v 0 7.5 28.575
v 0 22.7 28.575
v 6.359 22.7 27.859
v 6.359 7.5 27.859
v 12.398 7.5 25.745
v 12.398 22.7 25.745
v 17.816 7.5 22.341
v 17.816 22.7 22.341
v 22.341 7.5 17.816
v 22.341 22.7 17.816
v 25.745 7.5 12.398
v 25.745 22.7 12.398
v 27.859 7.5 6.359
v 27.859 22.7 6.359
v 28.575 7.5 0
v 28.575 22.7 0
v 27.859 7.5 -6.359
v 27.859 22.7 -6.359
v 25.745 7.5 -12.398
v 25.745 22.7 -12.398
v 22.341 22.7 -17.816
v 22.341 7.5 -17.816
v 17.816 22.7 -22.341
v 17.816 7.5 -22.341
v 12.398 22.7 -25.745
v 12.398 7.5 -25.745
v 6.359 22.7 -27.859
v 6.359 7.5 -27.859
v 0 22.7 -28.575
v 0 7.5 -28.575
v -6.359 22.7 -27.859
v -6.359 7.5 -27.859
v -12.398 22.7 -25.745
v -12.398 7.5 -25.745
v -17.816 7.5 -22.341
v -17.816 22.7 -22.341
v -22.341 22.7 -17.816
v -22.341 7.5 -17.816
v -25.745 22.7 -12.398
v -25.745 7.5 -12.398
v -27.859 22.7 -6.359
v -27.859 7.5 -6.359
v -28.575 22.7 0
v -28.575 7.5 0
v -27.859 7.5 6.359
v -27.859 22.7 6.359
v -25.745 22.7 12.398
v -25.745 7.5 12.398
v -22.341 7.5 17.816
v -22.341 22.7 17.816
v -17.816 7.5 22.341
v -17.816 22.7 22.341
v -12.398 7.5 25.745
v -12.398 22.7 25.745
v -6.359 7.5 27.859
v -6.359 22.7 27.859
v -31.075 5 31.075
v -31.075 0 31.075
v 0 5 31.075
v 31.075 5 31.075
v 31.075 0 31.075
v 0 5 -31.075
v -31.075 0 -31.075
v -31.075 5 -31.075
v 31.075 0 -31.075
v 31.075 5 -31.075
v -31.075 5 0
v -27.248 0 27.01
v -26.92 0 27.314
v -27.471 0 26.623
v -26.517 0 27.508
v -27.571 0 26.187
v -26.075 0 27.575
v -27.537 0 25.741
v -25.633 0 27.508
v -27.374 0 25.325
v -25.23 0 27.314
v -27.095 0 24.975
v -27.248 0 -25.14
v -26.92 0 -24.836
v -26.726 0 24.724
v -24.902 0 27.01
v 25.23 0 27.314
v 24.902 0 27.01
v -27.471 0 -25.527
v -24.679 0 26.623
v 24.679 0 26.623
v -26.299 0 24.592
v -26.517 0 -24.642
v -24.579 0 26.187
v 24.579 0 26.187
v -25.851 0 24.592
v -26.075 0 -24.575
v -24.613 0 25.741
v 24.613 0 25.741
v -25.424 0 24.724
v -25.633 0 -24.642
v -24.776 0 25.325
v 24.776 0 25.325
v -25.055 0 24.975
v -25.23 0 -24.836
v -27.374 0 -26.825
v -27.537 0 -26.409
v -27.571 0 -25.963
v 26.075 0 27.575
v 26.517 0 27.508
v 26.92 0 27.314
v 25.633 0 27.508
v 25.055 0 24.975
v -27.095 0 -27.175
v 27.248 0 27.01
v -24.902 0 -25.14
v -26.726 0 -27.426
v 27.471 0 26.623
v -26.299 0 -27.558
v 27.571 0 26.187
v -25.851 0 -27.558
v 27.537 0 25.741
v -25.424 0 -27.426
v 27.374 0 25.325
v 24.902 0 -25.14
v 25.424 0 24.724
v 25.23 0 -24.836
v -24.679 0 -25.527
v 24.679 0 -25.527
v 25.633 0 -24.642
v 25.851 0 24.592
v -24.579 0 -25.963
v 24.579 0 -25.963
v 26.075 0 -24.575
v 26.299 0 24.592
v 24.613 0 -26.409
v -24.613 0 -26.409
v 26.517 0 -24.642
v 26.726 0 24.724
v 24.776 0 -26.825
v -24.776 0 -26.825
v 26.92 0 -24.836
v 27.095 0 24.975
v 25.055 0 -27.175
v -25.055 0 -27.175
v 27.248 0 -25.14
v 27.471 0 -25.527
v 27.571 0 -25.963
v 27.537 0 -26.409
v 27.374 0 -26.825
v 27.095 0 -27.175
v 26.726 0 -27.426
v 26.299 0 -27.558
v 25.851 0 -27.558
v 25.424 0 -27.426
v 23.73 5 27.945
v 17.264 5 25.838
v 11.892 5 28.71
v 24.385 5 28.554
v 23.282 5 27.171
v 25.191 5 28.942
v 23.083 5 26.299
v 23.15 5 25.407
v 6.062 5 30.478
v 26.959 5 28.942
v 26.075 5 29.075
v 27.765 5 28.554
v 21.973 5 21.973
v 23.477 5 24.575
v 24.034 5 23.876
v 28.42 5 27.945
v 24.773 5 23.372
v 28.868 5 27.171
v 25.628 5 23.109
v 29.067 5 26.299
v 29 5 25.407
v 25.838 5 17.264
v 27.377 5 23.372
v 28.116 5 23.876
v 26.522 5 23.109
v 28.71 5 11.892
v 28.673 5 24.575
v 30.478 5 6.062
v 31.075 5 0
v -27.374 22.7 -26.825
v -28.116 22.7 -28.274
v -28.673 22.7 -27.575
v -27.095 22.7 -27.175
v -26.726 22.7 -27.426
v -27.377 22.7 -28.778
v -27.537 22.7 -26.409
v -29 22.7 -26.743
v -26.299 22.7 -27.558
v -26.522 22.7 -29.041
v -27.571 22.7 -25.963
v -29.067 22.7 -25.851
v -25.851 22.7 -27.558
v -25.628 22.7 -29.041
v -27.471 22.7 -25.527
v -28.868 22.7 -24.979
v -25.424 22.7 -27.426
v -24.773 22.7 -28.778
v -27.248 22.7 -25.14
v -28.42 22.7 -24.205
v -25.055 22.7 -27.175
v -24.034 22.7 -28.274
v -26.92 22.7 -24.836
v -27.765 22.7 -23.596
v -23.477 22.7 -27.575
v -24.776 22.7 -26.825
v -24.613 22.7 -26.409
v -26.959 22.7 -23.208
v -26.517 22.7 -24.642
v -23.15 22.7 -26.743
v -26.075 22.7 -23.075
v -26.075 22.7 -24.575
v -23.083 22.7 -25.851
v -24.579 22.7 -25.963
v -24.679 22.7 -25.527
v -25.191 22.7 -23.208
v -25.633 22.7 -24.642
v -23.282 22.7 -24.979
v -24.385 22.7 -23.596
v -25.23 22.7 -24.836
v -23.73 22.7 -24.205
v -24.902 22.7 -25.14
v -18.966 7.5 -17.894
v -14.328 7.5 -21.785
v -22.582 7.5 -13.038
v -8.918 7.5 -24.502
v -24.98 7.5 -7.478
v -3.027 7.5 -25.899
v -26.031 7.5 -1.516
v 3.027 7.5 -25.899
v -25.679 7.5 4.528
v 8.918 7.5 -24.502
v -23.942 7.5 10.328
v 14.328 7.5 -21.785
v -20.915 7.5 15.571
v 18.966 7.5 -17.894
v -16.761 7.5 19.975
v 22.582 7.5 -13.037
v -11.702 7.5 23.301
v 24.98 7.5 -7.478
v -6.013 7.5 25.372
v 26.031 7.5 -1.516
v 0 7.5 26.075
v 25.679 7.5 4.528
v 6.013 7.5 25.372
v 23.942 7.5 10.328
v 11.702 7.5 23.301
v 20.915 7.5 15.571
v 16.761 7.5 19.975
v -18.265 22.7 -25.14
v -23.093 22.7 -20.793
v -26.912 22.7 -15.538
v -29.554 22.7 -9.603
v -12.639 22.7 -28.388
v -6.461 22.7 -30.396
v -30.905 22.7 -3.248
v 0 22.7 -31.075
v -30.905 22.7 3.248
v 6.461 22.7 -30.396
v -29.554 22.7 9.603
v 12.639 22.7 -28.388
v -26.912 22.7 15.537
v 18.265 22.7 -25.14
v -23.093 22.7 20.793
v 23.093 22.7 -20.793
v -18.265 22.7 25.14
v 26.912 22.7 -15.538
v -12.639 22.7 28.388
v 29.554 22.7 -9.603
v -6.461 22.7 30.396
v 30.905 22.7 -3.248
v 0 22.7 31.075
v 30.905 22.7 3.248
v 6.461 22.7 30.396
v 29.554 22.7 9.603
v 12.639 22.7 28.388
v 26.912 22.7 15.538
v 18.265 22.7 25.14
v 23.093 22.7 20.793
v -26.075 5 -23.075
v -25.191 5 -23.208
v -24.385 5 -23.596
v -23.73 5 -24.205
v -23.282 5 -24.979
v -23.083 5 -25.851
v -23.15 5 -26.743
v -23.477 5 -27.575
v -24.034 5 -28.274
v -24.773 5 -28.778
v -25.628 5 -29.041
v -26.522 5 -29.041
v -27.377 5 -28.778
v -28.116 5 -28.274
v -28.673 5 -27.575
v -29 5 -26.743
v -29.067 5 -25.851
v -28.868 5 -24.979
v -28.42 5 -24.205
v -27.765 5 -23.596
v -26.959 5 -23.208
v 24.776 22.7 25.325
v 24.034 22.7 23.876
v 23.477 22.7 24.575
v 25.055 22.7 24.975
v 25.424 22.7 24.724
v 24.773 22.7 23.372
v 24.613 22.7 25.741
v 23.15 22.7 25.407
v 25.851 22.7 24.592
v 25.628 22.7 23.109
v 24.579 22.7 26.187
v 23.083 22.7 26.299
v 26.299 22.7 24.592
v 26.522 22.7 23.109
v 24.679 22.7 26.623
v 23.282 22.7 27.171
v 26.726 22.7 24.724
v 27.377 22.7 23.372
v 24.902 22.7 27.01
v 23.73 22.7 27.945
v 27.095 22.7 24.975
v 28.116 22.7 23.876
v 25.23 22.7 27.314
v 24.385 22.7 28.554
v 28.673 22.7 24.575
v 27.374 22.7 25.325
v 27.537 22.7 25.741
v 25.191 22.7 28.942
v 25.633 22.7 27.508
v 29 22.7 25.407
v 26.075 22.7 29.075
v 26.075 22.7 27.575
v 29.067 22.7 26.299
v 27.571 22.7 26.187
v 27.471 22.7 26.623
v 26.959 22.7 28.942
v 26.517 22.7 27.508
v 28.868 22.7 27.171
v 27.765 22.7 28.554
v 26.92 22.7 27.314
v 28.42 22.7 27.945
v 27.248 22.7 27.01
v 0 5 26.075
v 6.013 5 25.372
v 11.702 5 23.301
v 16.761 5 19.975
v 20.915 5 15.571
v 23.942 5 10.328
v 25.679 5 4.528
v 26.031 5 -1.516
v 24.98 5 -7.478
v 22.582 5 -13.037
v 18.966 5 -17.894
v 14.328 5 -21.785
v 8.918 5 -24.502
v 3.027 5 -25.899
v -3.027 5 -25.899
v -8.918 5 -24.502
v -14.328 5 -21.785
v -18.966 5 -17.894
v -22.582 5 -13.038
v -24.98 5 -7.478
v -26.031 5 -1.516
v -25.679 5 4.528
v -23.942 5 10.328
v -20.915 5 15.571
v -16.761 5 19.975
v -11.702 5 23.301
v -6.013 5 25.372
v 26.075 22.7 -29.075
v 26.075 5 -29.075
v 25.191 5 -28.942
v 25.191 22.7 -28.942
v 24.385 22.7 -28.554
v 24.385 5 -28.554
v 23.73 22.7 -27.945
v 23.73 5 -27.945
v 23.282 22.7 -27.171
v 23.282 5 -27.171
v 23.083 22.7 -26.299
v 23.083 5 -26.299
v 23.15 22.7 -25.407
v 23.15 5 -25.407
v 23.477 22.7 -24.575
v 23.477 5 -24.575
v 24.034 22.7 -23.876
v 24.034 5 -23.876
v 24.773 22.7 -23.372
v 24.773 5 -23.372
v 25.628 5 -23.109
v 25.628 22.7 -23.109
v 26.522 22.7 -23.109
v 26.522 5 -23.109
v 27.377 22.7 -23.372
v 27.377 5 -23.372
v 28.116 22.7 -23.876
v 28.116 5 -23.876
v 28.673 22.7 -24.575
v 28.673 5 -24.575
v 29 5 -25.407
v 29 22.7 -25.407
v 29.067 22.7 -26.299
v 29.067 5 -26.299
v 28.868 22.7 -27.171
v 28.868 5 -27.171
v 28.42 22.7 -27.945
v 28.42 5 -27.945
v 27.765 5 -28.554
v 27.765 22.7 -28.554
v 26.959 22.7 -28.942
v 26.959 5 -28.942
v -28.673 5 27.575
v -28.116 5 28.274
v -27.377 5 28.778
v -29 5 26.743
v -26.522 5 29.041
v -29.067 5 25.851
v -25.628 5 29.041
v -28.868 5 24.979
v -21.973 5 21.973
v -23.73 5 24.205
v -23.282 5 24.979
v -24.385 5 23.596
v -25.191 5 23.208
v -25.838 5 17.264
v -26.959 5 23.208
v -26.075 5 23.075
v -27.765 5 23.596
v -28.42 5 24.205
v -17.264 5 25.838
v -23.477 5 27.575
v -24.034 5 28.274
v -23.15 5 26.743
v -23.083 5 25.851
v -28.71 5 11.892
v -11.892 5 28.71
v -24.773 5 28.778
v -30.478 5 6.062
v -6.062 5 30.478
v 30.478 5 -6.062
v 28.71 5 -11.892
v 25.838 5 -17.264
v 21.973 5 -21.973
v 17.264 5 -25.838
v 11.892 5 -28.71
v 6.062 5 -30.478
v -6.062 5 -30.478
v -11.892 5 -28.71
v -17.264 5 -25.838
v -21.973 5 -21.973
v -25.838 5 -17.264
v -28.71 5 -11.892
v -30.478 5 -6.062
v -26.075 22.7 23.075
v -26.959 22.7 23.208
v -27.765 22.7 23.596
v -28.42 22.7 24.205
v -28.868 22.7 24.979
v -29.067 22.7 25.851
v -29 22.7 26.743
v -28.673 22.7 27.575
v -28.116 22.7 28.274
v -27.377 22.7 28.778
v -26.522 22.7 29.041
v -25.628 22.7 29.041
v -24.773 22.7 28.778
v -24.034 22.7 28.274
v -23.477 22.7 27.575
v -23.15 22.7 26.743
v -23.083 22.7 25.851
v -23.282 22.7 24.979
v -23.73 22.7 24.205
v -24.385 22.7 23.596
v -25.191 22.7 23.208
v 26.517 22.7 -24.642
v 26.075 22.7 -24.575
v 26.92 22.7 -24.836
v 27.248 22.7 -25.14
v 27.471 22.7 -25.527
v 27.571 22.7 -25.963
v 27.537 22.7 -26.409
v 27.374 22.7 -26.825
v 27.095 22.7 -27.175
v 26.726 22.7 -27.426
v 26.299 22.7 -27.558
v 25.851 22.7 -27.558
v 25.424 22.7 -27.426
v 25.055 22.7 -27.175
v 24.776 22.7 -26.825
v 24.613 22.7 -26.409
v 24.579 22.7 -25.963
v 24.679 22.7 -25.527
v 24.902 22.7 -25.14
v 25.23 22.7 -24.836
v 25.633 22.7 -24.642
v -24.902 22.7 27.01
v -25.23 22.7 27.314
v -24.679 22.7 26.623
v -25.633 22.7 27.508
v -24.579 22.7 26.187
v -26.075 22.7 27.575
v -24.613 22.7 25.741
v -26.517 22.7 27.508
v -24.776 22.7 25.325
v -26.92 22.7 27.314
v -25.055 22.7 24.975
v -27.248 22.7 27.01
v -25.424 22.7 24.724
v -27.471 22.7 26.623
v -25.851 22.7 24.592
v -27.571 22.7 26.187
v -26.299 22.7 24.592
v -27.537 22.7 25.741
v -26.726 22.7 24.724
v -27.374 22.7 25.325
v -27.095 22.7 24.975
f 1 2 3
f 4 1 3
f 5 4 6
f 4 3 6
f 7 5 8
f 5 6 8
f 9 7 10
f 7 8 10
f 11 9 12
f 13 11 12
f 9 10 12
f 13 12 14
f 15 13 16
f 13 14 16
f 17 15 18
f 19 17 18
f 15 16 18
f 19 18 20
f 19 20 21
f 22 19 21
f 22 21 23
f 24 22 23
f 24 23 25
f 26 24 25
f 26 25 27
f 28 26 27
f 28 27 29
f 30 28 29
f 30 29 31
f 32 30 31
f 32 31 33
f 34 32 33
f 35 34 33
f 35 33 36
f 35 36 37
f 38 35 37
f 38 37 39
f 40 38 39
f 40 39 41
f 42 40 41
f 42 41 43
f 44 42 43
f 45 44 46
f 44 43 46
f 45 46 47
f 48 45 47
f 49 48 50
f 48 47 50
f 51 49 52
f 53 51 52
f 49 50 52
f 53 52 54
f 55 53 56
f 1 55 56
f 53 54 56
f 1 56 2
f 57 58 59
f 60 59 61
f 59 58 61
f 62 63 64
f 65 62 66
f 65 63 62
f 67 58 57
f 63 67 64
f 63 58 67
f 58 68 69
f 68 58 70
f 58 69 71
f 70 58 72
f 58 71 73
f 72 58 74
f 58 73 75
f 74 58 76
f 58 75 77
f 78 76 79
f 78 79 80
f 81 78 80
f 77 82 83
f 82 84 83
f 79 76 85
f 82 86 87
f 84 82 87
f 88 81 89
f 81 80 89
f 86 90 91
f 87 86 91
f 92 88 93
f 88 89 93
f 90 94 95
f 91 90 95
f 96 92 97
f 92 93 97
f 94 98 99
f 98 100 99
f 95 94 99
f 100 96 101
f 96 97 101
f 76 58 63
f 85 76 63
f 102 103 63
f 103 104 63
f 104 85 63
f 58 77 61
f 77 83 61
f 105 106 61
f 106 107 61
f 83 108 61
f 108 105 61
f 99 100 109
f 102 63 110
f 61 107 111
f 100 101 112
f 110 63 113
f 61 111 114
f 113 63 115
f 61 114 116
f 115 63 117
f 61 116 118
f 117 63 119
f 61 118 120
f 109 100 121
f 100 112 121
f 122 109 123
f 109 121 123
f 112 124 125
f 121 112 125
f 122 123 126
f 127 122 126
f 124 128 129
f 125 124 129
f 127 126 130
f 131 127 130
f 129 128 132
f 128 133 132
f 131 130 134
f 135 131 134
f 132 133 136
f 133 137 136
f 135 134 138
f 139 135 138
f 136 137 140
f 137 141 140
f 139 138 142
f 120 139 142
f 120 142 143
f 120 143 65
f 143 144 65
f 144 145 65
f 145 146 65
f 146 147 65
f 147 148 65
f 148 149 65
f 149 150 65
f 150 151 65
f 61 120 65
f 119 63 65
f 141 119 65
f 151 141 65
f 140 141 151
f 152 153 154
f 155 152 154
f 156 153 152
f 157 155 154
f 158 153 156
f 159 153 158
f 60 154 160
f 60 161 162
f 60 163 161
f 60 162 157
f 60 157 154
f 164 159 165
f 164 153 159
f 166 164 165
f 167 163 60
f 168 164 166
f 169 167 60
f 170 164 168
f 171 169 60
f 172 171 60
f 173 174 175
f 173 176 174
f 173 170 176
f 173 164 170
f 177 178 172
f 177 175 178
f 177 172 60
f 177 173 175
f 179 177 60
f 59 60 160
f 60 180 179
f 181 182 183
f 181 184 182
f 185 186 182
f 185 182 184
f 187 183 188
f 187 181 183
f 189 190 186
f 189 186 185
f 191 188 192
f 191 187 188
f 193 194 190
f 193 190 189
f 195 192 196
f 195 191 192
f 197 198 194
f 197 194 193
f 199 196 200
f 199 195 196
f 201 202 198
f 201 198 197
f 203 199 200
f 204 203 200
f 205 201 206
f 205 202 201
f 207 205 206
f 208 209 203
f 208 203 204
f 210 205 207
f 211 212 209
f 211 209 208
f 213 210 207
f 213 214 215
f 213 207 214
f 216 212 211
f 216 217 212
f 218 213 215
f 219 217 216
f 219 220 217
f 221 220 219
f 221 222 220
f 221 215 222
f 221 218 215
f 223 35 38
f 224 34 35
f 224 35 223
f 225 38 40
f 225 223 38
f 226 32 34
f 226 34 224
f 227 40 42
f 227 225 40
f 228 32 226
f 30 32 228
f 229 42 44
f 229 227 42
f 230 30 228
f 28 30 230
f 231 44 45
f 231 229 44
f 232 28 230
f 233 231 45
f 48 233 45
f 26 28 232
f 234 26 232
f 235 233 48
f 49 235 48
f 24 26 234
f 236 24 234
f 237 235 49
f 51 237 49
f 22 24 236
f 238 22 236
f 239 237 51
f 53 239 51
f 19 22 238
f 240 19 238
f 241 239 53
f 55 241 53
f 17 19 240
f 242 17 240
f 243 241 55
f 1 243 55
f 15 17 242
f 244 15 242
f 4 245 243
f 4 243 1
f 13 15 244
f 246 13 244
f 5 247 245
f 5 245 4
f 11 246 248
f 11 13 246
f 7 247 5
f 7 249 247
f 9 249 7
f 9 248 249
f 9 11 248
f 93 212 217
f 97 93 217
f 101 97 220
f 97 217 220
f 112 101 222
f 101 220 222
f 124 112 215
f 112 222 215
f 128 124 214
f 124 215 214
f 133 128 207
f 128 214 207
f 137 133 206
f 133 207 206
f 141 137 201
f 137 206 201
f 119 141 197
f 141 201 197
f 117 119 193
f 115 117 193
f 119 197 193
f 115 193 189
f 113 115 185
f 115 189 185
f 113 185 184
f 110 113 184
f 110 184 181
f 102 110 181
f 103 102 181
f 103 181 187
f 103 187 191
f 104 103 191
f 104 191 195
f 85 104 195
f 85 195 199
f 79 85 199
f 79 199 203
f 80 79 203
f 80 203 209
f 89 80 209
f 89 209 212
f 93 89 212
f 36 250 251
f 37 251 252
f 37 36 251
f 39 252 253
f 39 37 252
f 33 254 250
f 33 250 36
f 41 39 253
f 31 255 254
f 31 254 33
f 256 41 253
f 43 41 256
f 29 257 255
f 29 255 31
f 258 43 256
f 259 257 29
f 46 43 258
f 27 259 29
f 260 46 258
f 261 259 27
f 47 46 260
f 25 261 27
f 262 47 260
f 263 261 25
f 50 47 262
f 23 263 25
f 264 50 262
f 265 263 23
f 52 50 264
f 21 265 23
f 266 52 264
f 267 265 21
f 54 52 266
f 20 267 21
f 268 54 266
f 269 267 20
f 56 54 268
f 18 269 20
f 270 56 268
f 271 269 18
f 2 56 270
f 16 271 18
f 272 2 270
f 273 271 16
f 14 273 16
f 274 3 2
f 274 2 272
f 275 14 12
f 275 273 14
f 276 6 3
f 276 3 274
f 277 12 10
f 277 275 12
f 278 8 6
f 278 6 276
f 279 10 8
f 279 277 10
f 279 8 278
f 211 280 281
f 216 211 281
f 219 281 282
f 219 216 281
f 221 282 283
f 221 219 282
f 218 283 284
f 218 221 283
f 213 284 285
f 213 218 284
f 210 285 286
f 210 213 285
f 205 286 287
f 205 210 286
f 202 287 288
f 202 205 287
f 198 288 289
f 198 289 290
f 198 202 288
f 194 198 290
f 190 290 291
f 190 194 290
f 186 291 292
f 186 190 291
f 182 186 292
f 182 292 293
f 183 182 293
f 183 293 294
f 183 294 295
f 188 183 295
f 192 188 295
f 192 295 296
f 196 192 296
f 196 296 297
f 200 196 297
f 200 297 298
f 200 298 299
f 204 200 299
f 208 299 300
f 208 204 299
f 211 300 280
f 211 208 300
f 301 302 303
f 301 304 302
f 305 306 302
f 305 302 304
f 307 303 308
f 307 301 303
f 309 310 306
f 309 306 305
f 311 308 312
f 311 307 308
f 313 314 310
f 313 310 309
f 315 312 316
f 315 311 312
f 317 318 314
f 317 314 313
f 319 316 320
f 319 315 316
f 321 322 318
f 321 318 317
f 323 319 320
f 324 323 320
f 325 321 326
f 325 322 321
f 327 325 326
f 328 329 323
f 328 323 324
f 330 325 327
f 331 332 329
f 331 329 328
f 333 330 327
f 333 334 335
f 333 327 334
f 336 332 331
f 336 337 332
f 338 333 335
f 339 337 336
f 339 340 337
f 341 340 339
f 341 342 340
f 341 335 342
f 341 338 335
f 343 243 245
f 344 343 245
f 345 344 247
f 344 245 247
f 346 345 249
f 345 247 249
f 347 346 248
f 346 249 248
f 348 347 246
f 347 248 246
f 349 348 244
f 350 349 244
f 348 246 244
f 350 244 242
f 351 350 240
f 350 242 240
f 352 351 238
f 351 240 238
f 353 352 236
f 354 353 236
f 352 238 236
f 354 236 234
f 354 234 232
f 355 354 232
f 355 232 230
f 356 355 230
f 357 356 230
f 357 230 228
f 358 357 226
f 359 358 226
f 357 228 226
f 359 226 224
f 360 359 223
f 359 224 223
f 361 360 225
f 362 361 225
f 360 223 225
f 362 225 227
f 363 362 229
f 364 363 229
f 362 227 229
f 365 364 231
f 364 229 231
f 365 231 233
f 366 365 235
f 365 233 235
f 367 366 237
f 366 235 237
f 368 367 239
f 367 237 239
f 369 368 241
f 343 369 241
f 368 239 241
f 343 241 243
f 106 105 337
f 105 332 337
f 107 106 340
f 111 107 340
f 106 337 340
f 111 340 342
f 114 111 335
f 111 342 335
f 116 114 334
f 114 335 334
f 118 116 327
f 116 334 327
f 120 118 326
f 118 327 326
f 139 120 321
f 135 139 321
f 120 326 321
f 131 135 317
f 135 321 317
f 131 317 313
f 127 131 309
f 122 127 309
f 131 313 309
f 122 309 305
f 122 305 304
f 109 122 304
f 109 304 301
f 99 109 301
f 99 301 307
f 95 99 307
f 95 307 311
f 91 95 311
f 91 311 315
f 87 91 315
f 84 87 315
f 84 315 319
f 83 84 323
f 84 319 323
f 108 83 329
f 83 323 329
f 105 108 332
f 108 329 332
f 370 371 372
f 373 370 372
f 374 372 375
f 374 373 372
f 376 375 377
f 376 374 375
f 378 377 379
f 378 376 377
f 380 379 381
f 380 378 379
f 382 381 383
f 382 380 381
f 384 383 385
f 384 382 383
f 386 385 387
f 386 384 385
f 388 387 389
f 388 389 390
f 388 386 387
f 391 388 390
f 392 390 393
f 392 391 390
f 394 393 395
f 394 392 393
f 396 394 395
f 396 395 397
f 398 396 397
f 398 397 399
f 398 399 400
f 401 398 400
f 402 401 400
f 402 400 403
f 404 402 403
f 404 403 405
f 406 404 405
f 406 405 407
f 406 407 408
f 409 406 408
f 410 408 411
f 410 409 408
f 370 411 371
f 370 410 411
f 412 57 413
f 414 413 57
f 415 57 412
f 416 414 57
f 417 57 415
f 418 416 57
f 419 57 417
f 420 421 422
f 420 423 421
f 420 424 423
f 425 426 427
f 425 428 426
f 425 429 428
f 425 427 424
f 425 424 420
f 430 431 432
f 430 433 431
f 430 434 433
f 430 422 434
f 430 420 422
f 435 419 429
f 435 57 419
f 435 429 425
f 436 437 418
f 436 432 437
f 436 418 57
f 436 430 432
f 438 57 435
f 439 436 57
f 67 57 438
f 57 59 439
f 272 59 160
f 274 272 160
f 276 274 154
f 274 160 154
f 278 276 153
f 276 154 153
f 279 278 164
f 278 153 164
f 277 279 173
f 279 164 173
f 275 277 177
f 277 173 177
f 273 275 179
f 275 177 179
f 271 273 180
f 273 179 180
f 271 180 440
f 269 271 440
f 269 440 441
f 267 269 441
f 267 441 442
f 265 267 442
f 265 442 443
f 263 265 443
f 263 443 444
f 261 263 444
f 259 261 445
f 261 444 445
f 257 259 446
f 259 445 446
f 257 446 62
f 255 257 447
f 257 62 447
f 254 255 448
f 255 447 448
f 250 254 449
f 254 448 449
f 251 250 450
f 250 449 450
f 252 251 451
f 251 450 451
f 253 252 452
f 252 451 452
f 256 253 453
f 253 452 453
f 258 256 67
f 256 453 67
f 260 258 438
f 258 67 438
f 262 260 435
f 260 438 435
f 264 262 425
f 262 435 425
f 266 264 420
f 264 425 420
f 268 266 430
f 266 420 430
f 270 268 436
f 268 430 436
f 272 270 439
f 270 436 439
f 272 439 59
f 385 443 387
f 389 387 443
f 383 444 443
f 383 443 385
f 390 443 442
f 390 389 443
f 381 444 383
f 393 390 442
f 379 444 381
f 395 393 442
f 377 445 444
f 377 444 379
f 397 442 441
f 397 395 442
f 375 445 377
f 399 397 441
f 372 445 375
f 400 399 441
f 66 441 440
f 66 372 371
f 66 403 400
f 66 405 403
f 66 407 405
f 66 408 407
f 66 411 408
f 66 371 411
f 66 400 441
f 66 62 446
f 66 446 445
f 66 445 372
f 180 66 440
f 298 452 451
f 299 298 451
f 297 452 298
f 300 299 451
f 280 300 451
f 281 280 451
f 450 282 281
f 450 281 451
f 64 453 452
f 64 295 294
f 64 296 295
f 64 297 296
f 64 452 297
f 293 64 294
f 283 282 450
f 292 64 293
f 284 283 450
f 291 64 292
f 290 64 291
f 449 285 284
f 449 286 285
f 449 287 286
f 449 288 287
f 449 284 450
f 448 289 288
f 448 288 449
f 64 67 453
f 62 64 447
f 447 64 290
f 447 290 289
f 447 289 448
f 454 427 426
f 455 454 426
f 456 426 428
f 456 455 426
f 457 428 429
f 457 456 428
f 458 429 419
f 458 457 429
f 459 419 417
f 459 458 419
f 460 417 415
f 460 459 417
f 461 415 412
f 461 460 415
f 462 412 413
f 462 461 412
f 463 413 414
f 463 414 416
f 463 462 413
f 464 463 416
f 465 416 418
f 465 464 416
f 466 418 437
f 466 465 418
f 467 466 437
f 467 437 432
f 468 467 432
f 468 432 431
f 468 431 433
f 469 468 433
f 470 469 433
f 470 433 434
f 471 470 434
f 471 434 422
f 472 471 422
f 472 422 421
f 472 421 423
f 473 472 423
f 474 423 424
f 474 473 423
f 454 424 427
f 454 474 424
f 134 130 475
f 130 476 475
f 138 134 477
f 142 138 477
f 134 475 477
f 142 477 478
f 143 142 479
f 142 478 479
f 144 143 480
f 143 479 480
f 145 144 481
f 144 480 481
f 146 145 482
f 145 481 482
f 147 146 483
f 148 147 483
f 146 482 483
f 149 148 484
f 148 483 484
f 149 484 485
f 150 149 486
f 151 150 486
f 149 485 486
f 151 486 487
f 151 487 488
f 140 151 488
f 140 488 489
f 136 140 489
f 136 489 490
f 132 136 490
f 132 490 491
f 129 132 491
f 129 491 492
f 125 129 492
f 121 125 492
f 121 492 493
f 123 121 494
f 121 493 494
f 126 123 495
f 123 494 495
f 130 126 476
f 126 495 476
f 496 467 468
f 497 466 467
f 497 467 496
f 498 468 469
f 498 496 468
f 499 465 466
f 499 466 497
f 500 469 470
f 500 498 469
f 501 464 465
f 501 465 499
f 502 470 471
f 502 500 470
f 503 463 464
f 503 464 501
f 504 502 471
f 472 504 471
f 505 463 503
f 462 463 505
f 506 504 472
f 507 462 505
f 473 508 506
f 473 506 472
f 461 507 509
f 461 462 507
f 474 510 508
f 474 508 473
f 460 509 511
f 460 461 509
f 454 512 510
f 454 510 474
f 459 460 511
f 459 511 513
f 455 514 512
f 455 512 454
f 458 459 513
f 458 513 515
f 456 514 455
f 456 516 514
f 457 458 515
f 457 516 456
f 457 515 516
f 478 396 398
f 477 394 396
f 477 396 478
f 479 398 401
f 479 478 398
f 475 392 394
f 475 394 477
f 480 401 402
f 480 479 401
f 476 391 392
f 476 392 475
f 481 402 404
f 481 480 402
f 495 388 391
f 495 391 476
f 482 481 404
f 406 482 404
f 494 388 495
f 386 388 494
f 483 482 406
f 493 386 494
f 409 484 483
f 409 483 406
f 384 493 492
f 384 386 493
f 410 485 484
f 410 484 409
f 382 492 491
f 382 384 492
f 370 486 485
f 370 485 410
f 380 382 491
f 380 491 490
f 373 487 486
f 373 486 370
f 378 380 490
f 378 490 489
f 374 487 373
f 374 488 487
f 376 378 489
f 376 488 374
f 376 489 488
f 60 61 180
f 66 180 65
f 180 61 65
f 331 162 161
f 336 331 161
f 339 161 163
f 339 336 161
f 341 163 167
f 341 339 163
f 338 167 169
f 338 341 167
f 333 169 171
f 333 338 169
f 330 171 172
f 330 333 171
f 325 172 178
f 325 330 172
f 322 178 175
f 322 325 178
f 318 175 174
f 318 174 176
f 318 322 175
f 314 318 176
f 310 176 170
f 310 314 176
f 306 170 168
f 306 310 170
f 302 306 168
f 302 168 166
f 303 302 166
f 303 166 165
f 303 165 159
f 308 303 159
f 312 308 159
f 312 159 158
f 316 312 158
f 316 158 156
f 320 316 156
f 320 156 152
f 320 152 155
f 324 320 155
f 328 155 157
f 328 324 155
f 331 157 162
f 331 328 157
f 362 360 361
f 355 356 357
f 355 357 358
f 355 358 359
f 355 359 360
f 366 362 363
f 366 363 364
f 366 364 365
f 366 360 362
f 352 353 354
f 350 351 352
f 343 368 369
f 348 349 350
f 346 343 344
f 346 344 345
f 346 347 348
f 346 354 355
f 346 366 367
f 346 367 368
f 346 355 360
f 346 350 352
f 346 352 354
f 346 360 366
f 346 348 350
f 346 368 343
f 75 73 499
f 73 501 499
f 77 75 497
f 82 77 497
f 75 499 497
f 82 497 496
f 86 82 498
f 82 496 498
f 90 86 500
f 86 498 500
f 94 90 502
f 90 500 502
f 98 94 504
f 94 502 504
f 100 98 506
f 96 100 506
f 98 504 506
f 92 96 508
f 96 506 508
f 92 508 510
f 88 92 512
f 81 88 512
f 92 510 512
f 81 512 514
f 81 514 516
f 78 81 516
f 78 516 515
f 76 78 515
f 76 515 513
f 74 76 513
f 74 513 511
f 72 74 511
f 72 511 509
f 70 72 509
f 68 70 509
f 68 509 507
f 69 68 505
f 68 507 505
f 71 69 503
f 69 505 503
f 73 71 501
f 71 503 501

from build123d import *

# Parameters (mm, degrees)
SKETCH1_W           = 62.15
SKETCH1_H           = 62.15
BOSS_EXTRUDE1_DEPTH = 5
SKETCH3_R           = 31.075
BOSS_EXTRUDE2_DEPTH = 17.7
SKETCH4_R           = 28.575
CUT_EXTRUDE2_DEPTH  = 17.7
BOSS_EXTRUDE3_START = 2.5
SKETCH5_R           = 28.575
SKETCH5_R_2         = 26.075
BOSS_EXTRUDE3_DEPTH = 2.5
CUT_EXTRUDE4_REACH  = 49.377
SKETCH8_R           = 1.5
BOSS_EXTRUDE5_START = 17.7
SKETCH9_R           = 3
SKETCH9_R_2         = 1.5
BOSS_EXTRUDE5_DEPTH = 17.7


with BuildPart() as part:
    # Sketch1 → Boss-Extrude1 (new body)
    with BuildSketch(Plane(origin=(0, 0, 0), x_dir=(1, 0, 0), z_dir=(0, 1, 0))):
        Rectangle(SKETCH1_W, SKETCH1_H)
    extrude(amount=BOSS_EXTRUDE1_DEPTH)

    # Sketch3 → Boss-Extrude2 (add)
    with BuildSketch(Plane(origin=(0, 5, 0), x_dir=(1, 0, 0), z_dir=(0, 1, 0))):
        with Locations(Location((0, 0, 0), (0, 0, 270))):
            Circle(SKETCH3_R)
    extrude(amount=BOSS_EXTRUDE2_DEPTH)

    # Sketch4 → Cut-Extrude2 (cut)
    with BuildSketch(Plane(origin=(0, 22.7, 0), x_dir=(1, 0, 0), z_dir=(0, 1, 0))):
        with Locations(Location((0, 0, 0), (0, 0, 270))):
            Circle(SKETCH4_R)
    extrude(amount=-CUT_EXTRUDE2_DEPTH, mode=Mode.SUBTRACT)

    # Sketch5 → Boss-Extrude3 (add)
    with BuildSketch(Plane(origin=(0, 5, 0), x_dir=(1, 0, 0), z_dir=(0, 1, 0)).offset(BOSS_EXTRUDE3_START)):
        with Locations(Location((0, 0, 0), (0, 0, 270))):
            Circle(SKETCH5_R)
        with Locations(Location((0, 0, 0), (0, 0, 270))):
            Circle(SKETCH5_R_2, mode=Mode.SUBTRACT)
    extrude(amount=-BOSS_EXTRUDE3_DEPTH)

    # Sketch8 → Cut-Extrude4 (cut, up to next)
    with BuildSketch(Plane(origin=(0, 5, 0), x_dir=(1, 0, 0), z_dir=(0, 1, 0)), mode=Mode.PRIVATE) as cut_extrude4_sk1:
        with Locations(Location((-26.075, 26.075, 0), (0, 0, 270))):
            Circle(SKETCH8_R)
    cut_extrude4_tool1 = extrude(cut_extrude4_sk1.sketch, amount=-CUT_EXTRUDE4_REACH, mode=Mode.PRIVATE) & part.part
    # Sketch8 → Cut-Extrude4 (cut, up to next)
    with BuildSketch(Plane(origin=(0, 5, 0), x_dir=(1, 0, 0), z_dir=(0, 1, 0)), mode=Mode.PRIVATE) as cut_extrude4_sk2:
        with Locations(Location((-26.075, -26.075, 0), (0, 0, 270))):
            Circle(SKETCH8_R)
    cut_extrude4_tool2 = extrude(cut_extrude4_sk2.sketch, amount=-CUT_EXTRUDE4_REACH, mode=Mode.PRIVATE) & part.part
    # Sketch8 → Cut-Extrude4 (cut, up to next)
    with BuildSketch(Plane(origin=(0, 5, 0), x_dir=(1, 0, 0), z_dir=(0, 1, 0)), mode=Mode.PRIVATE) as cut_extrude4_sk3:
        with Locations(Location((26.075, -26.075, 0), (0, 0, 270))):
            Circle(SKETCH8_R)
    cut_extrude4_tool3 = extrude(cut_extrude4_sk3.sketch, amount=-CUT_EXTRUDE4_REACH, mode=Mode.PRIVATE) & part.part
    # Sketch8 → Cut-Extrude4 (cut, up to next)
    with BuildSketch(Plane(origin=(0, 5, 0), x_dir=(1, 0, 0), z_dir=(0, 1, 0)), mode=Mode.PRIVATE) as cut_extrude4_sk4:
        with Locations(Location((26.075, 26.075, 0), (0, 0, 270))):
            Circle(SKETCH8_R)
    cut_extrude4_tool4 = extrude(cut_extrude4_sk4.sketch, amount=-CUT_EXTRUDE4_REACH, mode=Mode.PRIVATE) & part.part
    add(cut_extrude4_tool1.solids().sort_by_distance((-26.075, 5, -26.075))[0], mode=Mode.SUBTRACT)
    add(cut_extrude4_tool2.solids().sort_by_distance((-26.075, 5, 26.075))[0], mode=Mode.SUBTRACT)
    add(cut_extrude4_tool3.solids().sort_by_distance((26.075, 5, 26.075))[0], mode=Mode.SUBTRACT)
    add(cut_extrude4_tool4.solids().sort_by_distance((26.075, 5, -26.075))[0], mode=Mode.SUBTRACT)

    # Sketch9 → Boss-Extrude5 (add)
    # profile 1 of 4: a face of its own
    with BuildSketch(Plane(origin=(0, 5, 0), x_dir=(1, 0, 0), z_dir=(0, 1, 0)).offset(BOSS_EXTRUDE5_START)):
        with Locations(Location((-26.075, 26.075, 0), (0, 0, 270))):
            Circle(SKETCH9_R)
        with Locations(Location((-26.075, 26.075, 0), (0, 0, 270))):
            Circle(SKETCH9_R_2, mode=Mode.SUBTRACT)
    # profile 2 of 4: a face of its own
    with BuildSketch(Plane(origin=(0, 5, 0), x_dir=(1, 0, 0), z_dir=(0, 1, 0)).offset(BOSS_EXTRUDE5_START)):
        with Locations(Location((-26.075, -26.075, 0), (0, 0, 90))):
            Circle(SKETCH9_R)
        with Locations(Location((-26.075, -26.075, 0), (0, 0, 270))):
            Circle(SKETCH9_R_2, mode=Mode.SUBTRACT)
    # profile 3 of 4: a face of its own
    with BuildSketch(Plane(origin=(0, 5, 0), x_dir=(1, 0, 0), z_dir=(0, 1, 0)).offset(BOSS_EXTRUDE5_START)):
        with Locations(Location((26.075, -26.075, 0), (0, 0, 270))):
            Circle(SKETCH9_R)
        with Locations(Location((26.075, -26.075, 0), (0, 0, 270))):
            Circle(SKETCH9_R_2, mode=Mode.SUBTRACT)
    # profile 4 of 4: a face of its own
    with BuildSketch(Plane(origin=(0, 5, 0), x_dir=(1, 0, 0), z_dir=(0, 1, 0)).offset(BOSS_EXTRUDE5_START)):
        with Locations(Location((26.075, 26.075, 0), (0, 0, 90))):
            Circle(SKETCH9_R)
        with Locations(Location((26.075, 26.075, 0), (0, 0, 270))):
            Circle(SKETCH9_R_2, mode=Mode.SUBTRACT)
    extrude(amount=-BOSS_EXTRUDE5_DEPTH)


solid = part.part
